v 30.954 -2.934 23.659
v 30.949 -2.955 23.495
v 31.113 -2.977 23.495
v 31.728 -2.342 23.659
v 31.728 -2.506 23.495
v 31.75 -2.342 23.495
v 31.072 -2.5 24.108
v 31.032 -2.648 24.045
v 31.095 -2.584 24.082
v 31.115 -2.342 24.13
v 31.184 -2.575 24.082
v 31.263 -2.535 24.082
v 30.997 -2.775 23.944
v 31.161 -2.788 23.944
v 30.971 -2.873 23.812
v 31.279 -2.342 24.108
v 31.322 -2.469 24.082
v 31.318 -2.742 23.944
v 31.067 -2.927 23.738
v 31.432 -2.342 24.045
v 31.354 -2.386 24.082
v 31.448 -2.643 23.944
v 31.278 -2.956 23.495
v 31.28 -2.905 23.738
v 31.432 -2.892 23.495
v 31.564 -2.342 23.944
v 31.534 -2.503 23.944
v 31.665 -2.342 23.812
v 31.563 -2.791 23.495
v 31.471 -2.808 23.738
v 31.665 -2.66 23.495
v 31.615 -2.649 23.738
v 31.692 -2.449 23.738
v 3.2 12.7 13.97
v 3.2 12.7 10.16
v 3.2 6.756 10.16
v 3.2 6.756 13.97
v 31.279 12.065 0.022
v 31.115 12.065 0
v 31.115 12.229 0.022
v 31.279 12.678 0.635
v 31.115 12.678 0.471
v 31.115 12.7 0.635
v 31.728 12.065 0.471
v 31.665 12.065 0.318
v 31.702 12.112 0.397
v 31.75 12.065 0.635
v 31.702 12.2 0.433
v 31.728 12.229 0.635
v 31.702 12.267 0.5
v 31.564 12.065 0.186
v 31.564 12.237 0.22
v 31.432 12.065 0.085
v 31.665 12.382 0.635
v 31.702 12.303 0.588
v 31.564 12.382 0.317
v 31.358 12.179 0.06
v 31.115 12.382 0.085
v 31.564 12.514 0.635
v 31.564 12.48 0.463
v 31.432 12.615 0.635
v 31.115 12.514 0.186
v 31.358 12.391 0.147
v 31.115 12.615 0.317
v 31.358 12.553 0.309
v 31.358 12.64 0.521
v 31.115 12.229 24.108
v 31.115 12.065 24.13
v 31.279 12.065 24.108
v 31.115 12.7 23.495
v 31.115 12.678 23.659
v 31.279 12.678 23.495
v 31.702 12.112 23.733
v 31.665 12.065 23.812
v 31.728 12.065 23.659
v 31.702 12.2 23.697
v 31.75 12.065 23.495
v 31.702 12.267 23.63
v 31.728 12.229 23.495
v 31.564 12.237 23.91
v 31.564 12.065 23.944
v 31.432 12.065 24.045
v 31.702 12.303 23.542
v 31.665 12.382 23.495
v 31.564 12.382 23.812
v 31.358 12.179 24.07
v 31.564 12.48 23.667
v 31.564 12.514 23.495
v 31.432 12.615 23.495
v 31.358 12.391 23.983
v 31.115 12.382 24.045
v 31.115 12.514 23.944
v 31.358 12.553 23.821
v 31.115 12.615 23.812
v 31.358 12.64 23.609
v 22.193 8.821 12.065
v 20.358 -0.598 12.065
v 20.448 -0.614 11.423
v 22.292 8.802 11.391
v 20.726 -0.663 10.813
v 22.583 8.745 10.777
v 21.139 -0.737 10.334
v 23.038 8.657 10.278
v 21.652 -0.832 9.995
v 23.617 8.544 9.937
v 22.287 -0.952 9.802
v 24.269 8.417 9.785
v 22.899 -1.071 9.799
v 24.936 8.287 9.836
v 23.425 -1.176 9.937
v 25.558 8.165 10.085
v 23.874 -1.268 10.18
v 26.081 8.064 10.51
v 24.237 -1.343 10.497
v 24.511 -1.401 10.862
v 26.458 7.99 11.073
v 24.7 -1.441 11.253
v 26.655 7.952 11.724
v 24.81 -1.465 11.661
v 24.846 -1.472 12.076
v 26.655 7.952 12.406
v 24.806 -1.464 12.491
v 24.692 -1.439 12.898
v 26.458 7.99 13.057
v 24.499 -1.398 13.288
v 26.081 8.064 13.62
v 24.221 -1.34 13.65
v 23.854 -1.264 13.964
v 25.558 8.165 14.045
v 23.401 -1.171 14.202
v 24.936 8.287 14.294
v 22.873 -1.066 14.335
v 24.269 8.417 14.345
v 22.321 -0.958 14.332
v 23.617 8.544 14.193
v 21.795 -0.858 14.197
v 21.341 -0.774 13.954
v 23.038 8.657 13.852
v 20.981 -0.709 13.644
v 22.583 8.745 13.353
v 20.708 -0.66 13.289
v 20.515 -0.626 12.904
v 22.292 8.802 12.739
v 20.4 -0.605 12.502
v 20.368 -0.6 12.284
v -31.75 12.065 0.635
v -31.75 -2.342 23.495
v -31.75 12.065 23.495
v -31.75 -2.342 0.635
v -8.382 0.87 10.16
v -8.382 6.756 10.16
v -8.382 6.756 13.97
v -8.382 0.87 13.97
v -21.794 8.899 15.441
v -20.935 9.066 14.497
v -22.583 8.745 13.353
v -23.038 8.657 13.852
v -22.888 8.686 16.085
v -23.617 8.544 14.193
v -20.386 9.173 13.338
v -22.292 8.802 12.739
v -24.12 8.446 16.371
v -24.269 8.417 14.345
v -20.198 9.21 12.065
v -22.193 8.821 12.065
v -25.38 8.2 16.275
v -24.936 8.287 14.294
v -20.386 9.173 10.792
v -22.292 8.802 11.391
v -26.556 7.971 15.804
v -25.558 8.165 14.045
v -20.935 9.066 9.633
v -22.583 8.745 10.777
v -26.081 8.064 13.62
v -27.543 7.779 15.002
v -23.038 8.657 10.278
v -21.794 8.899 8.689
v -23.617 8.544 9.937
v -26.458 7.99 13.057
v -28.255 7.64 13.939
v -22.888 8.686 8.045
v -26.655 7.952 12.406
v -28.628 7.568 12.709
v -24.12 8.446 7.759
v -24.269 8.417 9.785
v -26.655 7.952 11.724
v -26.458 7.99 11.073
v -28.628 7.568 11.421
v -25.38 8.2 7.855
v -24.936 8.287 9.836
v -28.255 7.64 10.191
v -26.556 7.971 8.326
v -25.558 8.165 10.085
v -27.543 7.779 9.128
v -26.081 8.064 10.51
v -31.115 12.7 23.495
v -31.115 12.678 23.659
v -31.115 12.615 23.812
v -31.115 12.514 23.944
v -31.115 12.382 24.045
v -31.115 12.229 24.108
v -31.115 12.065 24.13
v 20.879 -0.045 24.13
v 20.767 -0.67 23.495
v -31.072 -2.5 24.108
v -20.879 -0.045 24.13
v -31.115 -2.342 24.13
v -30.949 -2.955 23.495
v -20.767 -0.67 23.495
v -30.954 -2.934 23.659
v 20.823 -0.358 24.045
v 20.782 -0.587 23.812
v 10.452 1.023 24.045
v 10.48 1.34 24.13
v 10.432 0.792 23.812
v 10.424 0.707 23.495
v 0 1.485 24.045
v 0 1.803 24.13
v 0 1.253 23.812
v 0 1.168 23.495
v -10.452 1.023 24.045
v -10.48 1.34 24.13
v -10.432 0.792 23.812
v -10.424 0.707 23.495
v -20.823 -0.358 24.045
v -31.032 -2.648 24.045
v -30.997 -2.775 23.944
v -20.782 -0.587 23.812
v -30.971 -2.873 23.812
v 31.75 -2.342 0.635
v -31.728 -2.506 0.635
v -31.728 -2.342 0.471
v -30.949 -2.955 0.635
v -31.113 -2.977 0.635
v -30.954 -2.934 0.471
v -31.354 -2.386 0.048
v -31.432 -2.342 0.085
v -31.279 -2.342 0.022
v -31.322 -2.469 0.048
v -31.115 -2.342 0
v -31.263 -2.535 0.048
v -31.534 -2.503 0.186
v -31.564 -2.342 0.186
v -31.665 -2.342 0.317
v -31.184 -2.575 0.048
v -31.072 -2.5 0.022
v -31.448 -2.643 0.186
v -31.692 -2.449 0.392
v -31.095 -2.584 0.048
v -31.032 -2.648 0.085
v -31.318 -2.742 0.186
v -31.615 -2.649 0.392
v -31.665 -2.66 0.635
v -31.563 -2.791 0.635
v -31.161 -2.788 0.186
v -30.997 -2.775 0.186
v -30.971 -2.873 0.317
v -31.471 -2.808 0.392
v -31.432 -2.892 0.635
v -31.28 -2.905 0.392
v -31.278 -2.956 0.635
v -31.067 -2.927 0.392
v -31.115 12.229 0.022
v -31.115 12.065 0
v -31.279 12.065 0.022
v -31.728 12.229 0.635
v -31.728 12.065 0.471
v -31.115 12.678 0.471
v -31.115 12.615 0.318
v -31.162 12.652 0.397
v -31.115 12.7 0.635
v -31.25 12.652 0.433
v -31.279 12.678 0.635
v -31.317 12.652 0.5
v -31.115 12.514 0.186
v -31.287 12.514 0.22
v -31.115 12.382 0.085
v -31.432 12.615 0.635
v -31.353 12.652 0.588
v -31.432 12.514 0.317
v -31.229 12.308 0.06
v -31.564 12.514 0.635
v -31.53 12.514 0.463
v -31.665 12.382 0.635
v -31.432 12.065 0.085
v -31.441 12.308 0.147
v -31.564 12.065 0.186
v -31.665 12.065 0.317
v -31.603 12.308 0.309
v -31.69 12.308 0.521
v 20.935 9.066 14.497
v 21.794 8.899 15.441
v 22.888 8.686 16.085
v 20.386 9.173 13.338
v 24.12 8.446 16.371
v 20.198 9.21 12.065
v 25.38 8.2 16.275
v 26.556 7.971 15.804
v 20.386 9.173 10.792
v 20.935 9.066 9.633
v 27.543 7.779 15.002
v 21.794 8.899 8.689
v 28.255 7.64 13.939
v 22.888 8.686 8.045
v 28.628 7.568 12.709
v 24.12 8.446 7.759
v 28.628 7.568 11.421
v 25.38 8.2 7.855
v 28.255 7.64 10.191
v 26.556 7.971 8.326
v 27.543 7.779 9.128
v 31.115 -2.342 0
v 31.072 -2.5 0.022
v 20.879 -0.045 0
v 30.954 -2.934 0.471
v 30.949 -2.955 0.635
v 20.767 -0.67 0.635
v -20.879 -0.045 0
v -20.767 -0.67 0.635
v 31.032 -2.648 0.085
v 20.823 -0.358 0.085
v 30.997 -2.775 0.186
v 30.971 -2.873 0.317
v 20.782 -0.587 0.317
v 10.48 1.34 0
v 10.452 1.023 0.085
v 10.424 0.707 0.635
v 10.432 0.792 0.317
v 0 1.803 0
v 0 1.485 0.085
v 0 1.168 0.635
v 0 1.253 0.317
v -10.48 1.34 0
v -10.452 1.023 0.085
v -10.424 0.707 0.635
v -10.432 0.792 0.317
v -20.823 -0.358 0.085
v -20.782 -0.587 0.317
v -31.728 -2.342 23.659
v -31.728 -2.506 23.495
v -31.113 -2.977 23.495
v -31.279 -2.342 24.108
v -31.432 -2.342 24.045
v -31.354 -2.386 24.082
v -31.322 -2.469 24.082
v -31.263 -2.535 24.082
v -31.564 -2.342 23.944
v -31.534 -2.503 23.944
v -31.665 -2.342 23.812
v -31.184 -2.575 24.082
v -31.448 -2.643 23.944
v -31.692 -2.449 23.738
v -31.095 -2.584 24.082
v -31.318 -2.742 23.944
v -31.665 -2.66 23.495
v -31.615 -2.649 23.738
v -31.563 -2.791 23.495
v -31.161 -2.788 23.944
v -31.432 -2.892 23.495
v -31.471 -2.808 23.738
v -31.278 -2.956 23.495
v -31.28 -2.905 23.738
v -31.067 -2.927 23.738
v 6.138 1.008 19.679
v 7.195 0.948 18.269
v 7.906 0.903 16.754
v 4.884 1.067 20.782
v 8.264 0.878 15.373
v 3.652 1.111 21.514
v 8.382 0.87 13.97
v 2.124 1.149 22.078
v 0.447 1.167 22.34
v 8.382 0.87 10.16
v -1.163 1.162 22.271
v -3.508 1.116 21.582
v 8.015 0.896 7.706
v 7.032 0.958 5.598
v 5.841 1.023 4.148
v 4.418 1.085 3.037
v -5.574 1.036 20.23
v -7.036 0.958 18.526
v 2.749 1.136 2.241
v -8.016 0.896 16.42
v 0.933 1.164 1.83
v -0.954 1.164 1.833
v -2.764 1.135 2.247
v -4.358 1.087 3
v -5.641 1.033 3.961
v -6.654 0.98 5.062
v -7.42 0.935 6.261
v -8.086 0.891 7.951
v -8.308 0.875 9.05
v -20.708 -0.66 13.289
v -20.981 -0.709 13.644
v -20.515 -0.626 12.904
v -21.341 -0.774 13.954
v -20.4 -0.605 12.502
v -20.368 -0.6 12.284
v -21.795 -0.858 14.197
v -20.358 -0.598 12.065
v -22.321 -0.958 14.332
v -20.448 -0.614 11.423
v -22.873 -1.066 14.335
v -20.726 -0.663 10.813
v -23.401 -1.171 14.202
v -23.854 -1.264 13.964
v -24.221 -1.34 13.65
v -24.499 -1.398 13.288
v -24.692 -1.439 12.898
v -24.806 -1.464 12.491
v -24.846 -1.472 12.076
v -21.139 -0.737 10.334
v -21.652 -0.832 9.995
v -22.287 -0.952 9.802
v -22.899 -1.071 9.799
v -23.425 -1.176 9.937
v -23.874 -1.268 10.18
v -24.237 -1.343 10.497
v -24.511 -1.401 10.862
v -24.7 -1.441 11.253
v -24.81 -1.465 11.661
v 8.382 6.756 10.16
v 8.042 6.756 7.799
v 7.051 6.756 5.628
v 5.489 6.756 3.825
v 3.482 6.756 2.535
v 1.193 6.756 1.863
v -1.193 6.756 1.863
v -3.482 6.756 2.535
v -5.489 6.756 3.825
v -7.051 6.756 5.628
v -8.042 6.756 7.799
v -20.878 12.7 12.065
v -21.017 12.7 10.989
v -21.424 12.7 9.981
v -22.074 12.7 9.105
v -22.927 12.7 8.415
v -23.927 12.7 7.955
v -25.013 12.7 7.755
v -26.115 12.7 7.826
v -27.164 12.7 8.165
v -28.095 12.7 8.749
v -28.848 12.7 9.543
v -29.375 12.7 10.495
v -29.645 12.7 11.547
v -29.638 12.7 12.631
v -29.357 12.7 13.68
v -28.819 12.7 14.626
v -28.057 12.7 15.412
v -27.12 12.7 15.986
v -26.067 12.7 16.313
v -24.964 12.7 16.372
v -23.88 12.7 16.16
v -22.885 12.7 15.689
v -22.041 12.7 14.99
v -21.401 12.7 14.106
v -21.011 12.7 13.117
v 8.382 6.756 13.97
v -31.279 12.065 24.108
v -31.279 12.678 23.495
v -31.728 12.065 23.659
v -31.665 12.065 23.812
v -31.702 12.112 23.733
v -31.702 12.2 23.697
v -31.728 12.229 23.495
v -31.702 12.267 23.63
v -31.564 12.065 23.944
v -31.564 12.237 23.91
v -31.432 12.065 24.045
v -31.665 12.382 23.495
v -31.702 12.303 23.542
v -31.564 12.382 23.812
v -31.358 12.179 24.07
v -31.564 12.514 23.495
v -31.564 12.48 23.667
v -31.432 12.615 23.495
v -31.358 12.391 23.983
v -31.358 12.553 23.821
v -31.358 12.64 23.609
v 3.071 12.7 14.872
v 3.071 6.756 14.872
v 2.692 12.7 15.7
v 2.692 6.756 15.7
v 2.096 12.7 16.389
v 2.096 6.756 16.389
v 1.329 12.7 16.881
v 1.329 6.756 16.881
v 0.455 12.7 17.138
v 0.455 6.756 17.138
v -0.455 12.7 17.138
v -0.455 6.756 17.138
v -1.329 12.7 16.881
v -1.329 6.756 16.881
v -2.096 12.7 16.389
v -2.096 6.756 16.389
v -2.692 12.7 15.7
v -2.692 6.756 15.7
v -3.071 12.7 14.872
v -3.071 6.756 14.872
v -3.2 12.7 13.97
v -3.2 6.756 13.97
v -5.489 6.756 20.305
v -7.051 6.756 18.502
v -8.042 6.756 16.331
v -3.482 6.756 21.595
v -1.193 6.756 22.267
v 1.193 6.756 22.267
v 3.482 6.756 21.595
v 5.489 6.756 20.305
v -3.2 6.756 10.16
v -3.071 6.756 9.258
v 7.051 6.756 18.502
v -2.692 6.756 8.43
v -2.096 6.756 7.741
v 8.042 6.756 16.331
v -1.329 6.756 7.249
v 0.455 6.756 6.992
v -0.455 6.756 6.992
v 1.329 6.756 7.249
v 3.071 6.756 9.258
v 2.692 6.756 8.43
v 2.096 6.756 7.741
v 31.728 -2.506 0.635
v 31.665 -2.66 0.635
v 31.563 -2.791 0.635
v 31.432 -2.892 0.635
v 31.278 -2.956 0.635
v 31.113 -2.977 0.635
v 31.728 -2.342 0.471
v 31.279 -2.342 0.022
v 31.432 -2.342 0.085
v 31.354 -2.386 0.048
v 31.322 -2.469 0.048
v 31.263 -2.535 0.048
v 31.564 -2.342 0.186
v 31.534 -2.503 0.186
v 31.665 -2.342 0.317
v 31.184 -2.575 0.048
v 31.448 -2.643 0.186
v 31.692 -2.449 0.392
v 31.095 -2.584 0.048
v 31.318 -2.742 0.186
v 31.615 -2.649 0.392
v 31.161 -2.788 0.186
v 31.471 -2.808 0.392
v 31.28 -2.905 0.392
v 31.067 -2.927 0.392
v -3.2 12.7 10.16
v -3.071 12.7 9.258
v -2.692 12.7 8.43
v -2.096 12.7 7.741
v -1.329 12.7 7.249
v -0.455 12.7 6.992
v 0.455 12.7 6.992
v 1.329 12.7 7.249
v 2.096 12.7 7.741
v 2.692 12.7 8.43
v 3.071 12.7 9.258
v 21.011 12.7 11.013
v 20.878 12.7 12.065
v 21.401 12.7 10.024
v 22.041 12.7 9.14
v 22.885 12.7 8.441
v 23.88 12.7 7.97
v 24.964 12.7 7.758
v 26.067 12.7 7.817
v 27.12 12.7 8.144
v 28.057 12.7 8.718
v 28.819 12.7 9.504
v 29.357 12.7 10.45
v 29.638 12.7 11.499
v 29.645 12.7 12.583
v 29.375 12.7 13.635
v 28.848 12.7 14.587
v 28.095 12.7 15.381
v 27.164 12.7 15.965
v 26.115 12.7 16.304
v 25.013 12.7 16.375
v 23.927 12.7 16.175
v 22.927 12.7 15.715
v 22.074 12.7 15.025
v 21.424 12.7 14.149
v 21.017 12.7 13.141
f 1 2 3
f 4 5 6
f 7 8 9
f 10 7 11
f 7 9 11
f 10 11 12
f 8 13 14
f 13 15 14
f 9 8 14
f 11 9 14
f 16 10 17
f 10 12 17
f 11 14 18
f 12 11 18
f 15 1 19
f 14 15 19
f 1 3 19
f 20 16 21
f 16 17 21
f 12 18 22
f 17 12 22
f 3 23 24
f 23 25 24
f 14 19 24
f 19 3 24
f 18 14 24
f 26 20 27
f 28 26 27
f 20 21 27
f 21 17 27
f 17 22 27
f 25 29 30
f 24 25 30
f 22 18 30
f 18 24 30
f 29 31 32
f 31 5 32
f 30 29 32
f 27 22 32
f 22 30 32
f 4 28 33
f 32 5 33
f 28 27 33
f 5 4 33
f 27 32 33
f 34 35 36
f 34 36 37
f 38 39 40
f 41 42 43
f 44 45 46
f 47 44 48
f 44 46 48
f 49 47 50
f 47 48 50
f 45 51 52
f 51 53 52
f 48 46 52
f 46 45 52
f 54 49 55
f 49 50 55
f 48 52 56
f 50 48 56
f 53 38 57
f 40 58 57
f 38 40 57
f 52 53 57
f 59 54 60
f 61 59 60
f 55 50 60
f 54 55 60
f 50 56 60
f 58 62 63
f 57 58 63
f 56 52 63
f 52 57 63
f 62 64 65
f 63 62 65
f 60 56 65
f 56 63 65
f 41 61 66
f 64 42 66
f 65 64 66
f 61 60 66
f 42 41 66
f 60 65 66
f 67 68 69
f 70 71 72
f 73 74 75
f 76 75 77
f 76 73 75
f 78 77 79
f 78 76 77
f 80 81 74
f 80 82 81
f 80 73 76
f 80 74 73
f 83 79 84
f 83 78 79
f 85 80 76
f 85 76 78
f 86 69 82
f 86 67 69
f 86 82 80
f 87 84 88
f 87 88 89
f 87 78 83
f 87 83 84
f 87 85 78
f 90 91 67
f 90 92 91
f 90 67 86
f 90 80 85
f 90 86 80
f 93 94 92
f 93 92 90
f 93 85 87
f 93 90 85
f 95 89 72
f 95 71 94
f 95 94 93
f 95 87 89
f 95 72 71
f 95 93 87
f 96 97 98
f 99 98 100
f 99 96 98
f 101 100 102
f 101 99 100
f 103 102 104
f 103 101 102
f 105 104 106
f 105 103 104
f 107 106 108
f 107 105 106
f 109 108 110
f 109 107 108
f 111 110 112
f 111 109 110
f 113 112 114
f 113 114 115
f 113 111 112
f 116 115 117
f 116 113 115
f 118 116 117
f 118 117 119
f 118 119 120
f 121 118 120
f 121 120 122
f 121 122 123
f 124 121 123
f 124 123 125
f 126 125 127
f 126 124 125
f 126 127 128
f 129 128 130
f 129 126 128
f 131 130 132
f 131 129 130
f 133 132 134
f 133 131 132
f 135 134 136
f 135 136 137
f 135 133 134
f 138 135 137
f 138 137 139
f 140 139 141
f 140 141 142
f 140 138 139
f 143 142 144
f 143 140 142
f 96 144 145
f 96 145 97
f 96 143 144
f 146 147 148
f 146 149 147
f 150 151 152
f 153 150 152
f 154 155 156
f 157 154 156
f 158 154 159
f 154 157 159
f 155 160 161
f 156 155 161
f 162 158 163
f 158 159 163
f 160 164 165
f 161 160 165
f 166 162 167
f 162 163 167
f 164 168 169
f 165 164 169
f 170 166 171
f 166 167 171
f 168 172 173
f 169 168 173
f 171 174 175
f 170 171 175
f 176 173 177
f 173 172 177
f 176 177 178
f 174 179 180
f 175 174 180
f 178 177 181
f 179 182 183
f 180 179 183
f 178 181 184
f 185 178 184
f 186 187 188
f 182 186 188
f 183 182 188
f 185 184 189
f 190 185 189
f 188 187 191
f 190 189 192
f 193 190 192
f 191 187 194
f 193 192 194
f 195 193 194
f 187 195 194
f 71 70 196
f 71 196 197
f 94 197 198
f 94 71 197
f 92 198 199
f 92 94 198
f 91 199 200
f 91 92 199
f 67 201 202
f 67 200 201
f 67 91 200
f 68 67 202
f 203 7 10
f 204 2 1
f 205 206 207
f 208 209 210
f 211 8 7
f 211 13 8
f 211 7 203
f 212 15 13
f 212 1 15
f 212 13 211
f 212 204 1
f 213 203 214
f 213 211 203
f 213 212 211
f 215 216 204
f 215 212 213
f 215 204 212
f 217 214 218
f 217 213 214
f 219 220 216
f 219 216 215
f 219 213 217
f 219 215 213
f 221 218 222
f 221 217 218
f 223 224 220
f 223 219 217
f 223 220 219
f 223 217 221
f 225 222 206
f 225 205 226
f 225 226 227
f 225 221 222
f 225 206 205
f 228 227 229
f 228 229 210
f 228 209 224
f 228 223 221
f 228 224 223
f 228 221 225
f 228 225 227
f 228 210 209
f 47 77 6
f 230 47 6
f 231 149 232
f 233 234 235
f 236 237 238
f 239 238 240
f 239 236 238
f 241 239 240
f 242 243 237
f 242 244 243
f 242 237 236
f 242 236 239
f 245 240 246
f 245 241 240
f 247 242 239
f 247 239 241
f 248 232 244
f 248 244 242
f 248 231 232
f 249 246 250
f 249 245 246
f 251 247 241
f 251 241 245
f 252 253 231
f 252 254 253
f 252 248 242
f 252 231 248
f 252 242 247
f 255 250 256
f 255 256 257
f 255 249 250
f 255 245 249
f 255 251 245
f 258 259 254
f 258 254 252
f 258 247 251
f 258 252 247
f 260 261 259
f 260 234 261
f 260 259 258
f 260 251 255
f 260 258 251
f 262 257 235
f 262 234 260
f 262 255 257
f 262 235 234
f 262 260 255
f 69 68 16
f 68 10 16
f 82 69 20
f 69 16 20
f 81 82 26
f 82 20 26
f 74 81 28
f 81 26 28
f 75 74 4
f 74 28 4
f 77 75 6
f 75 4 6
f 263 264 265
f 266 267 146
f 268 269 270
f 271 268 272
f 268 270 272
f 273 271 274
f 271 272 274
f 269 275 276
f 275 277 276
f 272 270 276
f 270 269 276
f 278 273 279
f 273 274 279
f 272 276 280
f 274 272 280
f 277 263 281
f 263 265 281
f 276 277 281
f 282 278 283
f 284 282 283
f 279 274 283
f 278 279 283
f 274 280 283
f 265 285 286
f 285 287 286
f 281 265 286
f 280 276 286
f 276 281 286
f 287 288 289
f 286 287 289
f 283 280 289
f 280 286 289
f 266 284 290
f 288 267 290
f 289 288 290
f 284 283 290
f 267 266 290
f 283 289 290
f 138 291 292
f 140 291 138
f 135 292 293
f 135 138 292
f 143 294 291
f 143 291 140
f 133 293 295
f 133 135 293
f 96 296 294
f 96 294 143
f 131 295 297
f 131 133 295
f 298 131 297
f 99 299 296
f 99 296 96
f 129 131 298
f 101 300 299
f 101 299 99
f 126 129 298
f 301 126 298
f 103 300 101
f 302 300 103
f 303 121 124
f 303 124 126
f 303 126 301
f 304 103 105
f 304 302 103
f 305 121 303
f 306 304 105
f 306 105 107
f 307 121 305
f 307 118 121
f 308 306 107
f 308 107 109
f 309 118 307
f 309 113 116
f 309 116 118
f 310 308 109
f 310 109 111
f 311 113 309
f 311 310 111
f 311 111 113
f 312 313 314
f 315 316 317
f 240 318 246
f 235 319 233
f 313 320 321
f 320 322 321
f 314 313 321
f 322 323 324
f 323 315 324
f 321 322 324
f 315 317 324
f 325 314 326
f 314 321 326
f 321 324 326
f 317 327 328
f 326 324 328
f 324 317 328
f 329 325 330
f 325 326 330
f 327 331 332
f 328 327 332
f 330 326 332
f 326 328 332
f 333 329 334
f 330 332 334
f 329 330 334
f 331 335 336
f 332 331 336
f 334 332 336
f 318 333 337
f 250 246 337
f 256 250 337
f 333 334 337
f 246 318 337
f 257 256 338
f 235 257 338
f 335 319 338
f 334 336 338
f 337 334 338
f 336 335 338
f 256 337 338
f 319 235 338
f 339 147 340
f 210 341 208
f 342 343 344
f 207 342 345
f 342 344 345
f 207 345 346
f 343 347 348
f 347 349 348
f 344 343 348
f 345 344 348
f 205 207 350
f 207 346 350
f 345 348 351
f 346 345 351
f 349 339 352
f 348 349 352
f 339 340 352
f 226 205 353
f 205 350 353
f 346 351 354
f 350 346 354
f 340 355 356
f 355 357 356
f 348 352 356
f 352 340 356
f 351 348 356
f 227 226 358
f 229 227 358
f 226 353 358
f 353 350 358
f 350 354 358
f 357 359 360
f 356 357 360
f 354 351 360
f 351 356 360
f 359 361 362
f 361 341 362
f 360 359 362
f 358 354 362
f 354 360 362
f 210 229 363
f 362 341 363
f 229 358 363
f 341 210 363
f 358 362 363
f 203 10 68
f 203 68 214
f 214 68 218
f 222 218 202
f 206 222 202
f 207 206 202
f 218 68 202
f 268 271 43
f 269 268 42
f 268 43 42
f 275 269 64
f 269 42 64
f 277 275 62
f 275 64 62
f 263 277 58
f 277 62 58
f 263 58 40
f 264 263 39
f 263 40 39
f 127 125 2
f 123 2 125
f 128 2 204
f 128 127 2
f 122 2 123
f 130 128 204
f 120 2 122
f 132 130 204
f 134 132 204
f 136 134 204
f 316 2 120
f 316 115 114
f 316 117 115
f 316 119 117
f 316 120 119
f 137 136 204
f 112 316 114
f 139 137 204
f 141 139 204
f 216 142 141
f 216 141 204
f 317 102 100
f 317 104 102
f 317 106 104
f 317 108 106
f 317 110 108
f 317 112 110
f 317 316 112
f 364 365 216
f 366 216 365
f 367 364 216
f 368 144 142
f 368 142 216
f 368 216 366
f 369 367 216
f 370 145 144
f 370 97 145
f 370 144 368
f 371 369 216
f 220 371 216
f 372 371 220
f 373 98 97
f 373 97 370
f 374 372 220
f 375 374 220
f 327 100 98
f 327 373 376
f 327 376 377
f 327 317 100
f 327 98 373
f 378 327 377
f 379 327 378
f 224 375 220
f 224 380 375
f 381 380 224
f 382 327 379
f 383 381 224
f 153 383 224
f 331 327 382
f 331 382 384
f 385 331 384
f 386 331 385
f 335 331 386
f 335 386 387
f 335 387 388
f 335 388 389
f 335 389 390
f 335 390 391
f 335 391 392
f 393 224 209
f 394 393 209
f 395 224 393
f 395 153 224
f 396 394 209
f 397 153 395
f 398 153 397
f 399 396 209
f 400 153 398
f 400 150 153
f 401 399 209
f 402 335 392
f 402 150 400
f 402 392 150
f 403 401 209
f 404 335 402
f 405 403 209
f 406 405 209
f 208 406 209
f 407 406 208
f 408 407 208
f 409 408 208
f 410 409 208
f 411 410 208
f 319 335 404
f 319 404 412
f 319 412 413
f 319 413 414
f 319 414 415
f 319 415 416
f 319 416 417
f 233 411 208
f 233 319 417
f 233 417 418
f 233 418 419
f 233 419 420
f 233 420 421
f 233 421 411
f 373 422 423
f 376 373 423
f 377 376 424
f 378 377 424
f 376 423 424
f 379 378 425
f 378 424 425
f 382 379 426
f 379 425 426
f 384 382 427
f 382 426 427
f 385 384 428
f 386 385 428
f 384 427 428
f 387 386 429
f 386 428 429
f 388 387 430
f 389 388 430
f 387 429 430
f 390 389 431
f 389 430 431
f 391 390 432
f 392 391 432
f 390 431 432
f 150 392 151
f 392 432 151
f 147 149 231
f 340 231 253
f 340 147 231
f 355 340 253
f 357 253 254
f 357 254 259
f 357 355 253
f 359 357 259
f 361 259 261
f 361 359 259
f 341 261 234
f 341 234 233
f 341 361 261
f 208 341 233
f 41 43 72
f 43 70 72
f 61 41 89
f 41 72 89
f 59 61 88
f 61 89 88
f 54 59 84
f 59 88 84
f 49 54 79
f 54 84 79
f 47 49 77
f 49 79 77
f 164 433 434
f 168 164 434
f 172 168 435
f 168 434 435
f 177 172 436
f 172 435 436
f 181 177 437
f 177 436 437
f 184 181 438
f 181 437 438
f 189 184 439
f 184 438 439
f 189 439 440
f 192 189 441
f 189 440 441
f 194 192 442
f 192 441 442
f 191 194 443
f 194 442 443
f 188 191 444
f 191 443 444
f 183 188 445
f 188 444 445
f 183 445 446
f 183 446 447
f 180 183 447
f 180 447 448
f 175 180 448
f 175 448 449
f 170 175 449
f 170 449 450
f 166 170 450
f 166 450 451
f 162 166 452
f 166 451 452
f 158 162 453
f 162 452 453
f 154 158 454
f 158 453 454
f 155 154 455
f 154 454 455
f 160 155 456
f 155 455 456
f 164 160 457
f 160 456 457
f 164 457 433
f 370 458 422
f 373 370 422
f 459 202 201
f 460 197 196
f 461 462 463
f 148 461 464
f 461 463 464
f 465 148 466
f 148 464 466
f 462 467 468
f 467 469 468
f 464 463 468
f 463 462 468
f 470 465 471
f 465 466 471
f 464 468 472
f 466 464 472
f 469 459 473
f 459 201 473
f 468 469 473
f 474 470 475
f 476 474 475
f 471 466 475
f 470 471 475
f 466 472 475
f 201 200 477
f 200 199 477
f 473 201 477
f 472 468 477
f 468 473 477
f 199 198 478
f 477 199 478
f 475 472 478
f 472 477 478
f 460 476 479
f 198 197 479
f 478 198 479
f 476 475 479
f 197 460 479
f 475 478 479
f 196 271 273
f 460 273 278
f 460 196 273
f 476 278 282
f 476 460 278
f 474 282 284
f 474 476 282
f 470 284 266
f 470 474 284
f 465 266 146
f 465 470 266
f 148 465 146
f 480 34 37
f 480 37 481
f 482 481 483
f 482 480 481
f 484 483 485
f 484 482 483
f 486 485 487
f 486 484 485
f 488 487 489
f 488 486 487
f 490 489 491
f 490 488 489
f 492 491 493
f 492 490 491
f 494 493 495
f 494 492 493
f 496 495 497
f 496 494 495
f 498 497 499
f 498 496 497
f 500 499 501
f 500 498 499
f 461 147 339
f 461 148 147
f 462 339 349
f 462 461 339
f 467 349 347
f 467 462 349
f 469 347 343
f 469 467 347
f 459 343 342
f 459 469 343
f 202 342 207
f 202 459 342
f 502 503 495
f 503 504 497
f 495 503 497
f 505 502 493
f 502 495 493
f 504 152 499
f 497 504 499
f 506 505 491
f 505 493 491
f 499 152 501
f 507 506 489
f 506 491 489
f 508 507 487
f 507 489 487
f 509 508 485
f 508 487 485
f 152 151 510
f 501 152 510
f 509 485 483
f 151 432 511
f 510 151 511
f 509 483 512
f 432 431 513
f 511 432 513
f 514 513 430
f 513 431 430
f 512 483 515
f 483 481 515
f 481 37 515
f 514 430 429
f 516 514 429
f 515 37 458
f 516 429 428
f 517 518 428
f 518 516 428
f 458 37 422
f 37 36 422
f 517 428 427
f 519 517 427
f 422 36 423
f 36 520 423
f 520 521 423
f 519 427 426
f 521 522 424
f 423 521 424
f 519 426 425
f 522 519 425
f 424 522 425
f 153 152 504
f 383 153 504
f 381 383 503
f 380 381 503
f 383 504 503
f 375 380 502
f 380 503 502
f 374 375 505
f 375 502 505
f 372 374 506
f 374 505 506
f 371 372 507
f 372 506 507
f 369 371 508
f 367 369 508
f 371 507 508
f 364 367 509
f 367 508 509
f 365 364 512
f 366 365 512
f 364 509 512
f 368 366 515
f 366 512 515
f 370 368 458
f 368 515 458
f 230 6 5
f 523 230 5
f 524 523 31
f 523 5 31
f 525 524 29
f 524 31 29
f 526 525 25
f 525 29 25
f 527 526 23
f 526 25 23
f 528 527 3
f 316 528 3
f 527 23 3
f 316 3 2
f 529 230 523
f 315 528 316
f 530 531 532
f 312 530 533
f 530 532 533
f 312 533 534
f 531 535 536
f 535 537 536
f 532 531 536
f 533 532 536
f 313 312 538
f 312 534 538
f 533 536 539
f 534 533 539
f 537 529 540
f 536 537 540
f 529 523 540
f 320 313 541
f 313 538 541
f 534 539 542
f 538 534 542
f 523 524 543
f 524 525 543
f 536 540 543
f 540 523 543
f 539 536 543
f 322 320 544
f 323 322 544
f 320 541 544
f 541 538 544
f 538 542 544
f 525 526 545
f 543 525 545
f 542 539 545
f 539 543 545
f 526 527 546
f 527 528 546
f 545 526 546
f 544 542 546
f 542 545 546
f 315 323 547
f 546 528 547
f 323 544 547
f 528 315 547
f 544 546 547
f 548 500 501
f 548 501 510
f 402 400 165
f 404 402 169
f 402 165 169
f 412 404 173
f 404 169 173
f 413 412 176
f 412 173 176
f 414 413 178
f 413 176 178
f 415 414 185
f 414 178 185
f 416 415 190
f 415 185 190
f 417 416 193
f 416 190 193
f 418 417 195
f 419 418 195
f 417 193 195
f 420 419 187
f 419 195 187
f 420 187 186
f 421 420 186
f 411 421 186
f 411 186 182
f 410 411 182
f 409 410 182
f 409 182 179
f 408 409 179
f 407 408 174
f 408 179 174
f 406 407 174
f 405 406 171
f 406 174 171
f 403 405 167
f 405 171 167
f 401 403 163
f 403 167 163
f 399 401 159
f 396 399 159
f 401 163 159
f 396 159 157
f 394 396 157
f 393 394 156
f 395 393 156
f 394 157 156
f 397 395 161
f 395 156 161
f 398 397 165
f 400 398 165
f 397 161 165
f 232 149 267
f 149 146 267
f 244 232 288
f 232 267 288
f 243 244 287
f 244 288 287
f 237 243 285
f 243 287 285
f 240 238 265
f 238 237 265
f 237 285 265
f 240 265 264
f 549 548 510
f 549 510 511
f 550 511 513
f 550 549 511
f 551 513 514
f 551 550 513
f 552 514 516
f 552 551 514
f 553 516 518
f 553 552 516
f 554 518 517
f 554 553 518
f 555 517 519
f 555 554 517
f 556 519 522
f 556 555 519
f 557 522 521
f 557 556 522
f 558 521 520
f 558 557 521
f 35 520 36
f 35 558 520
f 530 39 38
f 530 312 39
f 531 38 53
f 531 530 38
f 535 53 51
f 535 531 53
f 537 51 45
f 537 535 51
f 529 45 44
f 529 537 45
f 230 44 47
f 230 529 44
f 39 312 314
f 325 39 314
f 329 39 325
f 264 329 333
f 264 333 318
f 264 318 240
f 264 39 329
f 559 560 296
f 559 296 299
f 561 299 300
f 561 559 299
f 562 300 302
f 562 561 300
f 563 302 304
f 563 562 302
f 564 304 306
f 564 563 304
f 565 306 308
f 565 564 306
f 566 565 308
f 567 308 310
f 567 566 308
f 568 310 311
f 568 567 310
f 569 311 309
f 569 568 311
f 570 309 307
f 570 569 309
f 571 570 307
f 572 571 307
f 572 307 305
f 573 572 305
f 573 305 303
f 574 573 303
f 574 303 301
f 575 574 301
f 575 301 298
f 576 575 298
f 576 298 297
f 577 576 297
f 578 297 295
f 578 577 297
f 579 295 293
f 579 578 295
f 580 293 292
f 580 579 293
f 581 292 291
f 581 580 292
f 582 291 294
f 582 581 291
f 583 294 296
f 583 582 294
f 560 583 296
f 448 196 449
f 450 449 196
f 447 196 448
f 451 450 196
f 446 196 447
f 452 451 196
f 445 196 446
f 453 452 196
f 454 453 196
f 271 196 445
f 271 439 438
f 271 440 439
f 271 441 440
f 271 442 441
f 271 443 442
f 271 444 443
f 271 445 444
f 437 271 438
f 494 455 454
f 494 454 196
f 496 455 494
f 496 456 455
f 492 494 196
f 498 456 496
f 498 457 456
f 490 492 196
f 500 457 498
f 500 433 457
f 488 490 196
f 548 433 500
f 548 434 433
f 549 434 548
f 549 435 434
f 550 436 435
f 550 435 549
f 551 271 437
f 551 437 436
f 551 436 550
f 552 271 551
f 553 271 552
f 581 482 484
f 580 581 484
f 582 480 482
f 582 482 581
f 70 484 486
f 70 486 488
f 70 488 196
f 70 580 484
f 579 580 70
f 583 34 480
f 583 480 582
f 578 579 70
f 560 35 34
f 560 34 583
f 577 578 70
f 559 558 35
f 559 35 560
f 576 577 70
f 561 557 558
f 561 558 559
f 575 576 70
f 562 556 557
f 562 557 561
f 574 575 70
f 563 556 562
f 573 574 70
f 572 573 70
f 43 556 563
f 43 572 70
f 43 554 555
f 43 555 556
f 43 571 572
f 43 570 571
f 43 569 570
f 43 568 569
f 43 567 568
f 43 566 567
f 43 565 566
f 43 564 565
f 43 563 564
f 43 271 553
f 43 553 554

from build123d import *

# Parameters (mm, degrees)
BOSS_EXTRUDE1_DEPTH     = 24.13
FILLET1_R               = 0.635
CUT_EXTRUDE1_DEPTH      = 43.849527948
CUT_EXTRUDE6_DEPTH      = 42.512826607
CUT_EXTRUDE6_DEPTH_BACK = 5.588


with BuildPart() as part:
    # Sketch1 → Boss-Extrude1 (new body)
    with BuildSketch(Plane.XY):
        with BuildLine():
            Line((-31.75, 12.7), (31.75, 12.7))
            Line((31.75, 12.7), (31.75, -3.175))
            ThreePointArc((31.75, -3.175), (0, 1.167638116), (-31.75, -3.175))
            Line((-31.75, -3.175), (-31.75, 12.7))
        make_face()
    extrude(amount=BOSS_EXTRUDE1_DEPTH)

    # Sketch5 → Cut-Revolve1 (revolve, cut)
    with BuildSketch(Plane(origin=(0, 0, 12.065), x_dir=(-1, 0, 0), z_dir=(0, 0, -1)), mode=Mode.PRIVATE) as cut_revolve1_sk:
        Polygon((-22.482530384, -1.647401081), (-24.72635964, -2.084466602), (-26.680337626, 7.946965208), (-28.67485252, 7.558462523), (-30.361328492, 16.216578855), (-26.122984342, 17.042147061), align=None)
    cut_revolve1 = revolve(cut_revolve1_sk.sketch.rotate(Axis((26.472561187, 18.836822495, 12.065), (-0.19119226638023634, -0.9815526054554533, 0)), 180), axis=Axis((26.472561187, 18.836822495, 12.065), (-0.19119226638023634, -0.9815526054554533, 0)), mode=Mode.SUBTRACT)

    # Mirror1: Cut-Revolve1 across plane
    add(cut_revolve1.mirror(Plane(origin=(0, 0, 0), x_dir=(0, 0, 1), z_dir=(1, 0, 0))), mode=Mode.SUBTRACT)

    # Fillet1
    fillet1_edges = [part.edges().sort_by_distance(p)[0] for p in [
        (0, 12.7, 24.13),
        (-31.75, 4.7625, 24.13),
        (0, 1.167638116, 24.13),
        (-31.75, 4.7625, 0),
        (0, 12.7, 0),
        (31.75, 4.7625, 0),
        (0, 1.167638116, 0),
        (31.75, 4.7625, 24.13),
        (-31.75, -3.175, 12.065),
        (-31.75, 12.7, 12.065),
        (31.75, 12.7, 12.065),
        (31.75, -3.175, 12.065),
    ]]
    fillet(fillet1_edges, radius=FILLET1_R)

    # Sketch17 → Cut-Extrude1 (cut, through all)
    with BuildSketch(Plane(origin=(0, 12.7, 0), x_dir=(1, 0, 0), z_dir=(0, 1, 0))):
        with BuildLine():
            Line((-3.2004, -13.97), (-3.2004, -10.16))
            ThreePointArc((-3.2004, -10.16), (0, -6.9596), (3.2004, -10.16))
            Line((3.2004, -10.16), (3.2004, -13.97))
            ThreePointArc((3.2004, -13.97), (0, -17.1704), (-3.2004, -13.97))
        make_face()
    extrude(amount=-CUT_EXTRUDE1_DEPTH, mode=Mode.SUBTRACT)

    # Sketch18 → Cut-Extrude6 (cut, two sides: drawn at the far end of the back side and taken through both)
    with BuildSketch(Plane(origin=(0, 1.167638116, 0), x_dir=(-1, 0, 0), z_dir=(0, -1, 0)).offset(-CUT_EXTRUDE6_DEPTH_BACK)):
        with BuildLine():
            Line((8.382, -10.16), (8.382, -13.97))
            ThreePointArc((8.382, -13.97), (0, -22.352), (-8.382, -13.97))
            Line((-8.382, -13.97), (-8.382, -10.16))
            ThreePointArc((-8.382, -10.16), (0, -1.778), (8.382, -10.16))
        make_face()
    extrude(amount=CUT_EXTRUDE6_DEPTH + CUT_EXTRUDE6_DEPTH_BACK, mode=Mode.SUBTRACT)


solid = part.part
